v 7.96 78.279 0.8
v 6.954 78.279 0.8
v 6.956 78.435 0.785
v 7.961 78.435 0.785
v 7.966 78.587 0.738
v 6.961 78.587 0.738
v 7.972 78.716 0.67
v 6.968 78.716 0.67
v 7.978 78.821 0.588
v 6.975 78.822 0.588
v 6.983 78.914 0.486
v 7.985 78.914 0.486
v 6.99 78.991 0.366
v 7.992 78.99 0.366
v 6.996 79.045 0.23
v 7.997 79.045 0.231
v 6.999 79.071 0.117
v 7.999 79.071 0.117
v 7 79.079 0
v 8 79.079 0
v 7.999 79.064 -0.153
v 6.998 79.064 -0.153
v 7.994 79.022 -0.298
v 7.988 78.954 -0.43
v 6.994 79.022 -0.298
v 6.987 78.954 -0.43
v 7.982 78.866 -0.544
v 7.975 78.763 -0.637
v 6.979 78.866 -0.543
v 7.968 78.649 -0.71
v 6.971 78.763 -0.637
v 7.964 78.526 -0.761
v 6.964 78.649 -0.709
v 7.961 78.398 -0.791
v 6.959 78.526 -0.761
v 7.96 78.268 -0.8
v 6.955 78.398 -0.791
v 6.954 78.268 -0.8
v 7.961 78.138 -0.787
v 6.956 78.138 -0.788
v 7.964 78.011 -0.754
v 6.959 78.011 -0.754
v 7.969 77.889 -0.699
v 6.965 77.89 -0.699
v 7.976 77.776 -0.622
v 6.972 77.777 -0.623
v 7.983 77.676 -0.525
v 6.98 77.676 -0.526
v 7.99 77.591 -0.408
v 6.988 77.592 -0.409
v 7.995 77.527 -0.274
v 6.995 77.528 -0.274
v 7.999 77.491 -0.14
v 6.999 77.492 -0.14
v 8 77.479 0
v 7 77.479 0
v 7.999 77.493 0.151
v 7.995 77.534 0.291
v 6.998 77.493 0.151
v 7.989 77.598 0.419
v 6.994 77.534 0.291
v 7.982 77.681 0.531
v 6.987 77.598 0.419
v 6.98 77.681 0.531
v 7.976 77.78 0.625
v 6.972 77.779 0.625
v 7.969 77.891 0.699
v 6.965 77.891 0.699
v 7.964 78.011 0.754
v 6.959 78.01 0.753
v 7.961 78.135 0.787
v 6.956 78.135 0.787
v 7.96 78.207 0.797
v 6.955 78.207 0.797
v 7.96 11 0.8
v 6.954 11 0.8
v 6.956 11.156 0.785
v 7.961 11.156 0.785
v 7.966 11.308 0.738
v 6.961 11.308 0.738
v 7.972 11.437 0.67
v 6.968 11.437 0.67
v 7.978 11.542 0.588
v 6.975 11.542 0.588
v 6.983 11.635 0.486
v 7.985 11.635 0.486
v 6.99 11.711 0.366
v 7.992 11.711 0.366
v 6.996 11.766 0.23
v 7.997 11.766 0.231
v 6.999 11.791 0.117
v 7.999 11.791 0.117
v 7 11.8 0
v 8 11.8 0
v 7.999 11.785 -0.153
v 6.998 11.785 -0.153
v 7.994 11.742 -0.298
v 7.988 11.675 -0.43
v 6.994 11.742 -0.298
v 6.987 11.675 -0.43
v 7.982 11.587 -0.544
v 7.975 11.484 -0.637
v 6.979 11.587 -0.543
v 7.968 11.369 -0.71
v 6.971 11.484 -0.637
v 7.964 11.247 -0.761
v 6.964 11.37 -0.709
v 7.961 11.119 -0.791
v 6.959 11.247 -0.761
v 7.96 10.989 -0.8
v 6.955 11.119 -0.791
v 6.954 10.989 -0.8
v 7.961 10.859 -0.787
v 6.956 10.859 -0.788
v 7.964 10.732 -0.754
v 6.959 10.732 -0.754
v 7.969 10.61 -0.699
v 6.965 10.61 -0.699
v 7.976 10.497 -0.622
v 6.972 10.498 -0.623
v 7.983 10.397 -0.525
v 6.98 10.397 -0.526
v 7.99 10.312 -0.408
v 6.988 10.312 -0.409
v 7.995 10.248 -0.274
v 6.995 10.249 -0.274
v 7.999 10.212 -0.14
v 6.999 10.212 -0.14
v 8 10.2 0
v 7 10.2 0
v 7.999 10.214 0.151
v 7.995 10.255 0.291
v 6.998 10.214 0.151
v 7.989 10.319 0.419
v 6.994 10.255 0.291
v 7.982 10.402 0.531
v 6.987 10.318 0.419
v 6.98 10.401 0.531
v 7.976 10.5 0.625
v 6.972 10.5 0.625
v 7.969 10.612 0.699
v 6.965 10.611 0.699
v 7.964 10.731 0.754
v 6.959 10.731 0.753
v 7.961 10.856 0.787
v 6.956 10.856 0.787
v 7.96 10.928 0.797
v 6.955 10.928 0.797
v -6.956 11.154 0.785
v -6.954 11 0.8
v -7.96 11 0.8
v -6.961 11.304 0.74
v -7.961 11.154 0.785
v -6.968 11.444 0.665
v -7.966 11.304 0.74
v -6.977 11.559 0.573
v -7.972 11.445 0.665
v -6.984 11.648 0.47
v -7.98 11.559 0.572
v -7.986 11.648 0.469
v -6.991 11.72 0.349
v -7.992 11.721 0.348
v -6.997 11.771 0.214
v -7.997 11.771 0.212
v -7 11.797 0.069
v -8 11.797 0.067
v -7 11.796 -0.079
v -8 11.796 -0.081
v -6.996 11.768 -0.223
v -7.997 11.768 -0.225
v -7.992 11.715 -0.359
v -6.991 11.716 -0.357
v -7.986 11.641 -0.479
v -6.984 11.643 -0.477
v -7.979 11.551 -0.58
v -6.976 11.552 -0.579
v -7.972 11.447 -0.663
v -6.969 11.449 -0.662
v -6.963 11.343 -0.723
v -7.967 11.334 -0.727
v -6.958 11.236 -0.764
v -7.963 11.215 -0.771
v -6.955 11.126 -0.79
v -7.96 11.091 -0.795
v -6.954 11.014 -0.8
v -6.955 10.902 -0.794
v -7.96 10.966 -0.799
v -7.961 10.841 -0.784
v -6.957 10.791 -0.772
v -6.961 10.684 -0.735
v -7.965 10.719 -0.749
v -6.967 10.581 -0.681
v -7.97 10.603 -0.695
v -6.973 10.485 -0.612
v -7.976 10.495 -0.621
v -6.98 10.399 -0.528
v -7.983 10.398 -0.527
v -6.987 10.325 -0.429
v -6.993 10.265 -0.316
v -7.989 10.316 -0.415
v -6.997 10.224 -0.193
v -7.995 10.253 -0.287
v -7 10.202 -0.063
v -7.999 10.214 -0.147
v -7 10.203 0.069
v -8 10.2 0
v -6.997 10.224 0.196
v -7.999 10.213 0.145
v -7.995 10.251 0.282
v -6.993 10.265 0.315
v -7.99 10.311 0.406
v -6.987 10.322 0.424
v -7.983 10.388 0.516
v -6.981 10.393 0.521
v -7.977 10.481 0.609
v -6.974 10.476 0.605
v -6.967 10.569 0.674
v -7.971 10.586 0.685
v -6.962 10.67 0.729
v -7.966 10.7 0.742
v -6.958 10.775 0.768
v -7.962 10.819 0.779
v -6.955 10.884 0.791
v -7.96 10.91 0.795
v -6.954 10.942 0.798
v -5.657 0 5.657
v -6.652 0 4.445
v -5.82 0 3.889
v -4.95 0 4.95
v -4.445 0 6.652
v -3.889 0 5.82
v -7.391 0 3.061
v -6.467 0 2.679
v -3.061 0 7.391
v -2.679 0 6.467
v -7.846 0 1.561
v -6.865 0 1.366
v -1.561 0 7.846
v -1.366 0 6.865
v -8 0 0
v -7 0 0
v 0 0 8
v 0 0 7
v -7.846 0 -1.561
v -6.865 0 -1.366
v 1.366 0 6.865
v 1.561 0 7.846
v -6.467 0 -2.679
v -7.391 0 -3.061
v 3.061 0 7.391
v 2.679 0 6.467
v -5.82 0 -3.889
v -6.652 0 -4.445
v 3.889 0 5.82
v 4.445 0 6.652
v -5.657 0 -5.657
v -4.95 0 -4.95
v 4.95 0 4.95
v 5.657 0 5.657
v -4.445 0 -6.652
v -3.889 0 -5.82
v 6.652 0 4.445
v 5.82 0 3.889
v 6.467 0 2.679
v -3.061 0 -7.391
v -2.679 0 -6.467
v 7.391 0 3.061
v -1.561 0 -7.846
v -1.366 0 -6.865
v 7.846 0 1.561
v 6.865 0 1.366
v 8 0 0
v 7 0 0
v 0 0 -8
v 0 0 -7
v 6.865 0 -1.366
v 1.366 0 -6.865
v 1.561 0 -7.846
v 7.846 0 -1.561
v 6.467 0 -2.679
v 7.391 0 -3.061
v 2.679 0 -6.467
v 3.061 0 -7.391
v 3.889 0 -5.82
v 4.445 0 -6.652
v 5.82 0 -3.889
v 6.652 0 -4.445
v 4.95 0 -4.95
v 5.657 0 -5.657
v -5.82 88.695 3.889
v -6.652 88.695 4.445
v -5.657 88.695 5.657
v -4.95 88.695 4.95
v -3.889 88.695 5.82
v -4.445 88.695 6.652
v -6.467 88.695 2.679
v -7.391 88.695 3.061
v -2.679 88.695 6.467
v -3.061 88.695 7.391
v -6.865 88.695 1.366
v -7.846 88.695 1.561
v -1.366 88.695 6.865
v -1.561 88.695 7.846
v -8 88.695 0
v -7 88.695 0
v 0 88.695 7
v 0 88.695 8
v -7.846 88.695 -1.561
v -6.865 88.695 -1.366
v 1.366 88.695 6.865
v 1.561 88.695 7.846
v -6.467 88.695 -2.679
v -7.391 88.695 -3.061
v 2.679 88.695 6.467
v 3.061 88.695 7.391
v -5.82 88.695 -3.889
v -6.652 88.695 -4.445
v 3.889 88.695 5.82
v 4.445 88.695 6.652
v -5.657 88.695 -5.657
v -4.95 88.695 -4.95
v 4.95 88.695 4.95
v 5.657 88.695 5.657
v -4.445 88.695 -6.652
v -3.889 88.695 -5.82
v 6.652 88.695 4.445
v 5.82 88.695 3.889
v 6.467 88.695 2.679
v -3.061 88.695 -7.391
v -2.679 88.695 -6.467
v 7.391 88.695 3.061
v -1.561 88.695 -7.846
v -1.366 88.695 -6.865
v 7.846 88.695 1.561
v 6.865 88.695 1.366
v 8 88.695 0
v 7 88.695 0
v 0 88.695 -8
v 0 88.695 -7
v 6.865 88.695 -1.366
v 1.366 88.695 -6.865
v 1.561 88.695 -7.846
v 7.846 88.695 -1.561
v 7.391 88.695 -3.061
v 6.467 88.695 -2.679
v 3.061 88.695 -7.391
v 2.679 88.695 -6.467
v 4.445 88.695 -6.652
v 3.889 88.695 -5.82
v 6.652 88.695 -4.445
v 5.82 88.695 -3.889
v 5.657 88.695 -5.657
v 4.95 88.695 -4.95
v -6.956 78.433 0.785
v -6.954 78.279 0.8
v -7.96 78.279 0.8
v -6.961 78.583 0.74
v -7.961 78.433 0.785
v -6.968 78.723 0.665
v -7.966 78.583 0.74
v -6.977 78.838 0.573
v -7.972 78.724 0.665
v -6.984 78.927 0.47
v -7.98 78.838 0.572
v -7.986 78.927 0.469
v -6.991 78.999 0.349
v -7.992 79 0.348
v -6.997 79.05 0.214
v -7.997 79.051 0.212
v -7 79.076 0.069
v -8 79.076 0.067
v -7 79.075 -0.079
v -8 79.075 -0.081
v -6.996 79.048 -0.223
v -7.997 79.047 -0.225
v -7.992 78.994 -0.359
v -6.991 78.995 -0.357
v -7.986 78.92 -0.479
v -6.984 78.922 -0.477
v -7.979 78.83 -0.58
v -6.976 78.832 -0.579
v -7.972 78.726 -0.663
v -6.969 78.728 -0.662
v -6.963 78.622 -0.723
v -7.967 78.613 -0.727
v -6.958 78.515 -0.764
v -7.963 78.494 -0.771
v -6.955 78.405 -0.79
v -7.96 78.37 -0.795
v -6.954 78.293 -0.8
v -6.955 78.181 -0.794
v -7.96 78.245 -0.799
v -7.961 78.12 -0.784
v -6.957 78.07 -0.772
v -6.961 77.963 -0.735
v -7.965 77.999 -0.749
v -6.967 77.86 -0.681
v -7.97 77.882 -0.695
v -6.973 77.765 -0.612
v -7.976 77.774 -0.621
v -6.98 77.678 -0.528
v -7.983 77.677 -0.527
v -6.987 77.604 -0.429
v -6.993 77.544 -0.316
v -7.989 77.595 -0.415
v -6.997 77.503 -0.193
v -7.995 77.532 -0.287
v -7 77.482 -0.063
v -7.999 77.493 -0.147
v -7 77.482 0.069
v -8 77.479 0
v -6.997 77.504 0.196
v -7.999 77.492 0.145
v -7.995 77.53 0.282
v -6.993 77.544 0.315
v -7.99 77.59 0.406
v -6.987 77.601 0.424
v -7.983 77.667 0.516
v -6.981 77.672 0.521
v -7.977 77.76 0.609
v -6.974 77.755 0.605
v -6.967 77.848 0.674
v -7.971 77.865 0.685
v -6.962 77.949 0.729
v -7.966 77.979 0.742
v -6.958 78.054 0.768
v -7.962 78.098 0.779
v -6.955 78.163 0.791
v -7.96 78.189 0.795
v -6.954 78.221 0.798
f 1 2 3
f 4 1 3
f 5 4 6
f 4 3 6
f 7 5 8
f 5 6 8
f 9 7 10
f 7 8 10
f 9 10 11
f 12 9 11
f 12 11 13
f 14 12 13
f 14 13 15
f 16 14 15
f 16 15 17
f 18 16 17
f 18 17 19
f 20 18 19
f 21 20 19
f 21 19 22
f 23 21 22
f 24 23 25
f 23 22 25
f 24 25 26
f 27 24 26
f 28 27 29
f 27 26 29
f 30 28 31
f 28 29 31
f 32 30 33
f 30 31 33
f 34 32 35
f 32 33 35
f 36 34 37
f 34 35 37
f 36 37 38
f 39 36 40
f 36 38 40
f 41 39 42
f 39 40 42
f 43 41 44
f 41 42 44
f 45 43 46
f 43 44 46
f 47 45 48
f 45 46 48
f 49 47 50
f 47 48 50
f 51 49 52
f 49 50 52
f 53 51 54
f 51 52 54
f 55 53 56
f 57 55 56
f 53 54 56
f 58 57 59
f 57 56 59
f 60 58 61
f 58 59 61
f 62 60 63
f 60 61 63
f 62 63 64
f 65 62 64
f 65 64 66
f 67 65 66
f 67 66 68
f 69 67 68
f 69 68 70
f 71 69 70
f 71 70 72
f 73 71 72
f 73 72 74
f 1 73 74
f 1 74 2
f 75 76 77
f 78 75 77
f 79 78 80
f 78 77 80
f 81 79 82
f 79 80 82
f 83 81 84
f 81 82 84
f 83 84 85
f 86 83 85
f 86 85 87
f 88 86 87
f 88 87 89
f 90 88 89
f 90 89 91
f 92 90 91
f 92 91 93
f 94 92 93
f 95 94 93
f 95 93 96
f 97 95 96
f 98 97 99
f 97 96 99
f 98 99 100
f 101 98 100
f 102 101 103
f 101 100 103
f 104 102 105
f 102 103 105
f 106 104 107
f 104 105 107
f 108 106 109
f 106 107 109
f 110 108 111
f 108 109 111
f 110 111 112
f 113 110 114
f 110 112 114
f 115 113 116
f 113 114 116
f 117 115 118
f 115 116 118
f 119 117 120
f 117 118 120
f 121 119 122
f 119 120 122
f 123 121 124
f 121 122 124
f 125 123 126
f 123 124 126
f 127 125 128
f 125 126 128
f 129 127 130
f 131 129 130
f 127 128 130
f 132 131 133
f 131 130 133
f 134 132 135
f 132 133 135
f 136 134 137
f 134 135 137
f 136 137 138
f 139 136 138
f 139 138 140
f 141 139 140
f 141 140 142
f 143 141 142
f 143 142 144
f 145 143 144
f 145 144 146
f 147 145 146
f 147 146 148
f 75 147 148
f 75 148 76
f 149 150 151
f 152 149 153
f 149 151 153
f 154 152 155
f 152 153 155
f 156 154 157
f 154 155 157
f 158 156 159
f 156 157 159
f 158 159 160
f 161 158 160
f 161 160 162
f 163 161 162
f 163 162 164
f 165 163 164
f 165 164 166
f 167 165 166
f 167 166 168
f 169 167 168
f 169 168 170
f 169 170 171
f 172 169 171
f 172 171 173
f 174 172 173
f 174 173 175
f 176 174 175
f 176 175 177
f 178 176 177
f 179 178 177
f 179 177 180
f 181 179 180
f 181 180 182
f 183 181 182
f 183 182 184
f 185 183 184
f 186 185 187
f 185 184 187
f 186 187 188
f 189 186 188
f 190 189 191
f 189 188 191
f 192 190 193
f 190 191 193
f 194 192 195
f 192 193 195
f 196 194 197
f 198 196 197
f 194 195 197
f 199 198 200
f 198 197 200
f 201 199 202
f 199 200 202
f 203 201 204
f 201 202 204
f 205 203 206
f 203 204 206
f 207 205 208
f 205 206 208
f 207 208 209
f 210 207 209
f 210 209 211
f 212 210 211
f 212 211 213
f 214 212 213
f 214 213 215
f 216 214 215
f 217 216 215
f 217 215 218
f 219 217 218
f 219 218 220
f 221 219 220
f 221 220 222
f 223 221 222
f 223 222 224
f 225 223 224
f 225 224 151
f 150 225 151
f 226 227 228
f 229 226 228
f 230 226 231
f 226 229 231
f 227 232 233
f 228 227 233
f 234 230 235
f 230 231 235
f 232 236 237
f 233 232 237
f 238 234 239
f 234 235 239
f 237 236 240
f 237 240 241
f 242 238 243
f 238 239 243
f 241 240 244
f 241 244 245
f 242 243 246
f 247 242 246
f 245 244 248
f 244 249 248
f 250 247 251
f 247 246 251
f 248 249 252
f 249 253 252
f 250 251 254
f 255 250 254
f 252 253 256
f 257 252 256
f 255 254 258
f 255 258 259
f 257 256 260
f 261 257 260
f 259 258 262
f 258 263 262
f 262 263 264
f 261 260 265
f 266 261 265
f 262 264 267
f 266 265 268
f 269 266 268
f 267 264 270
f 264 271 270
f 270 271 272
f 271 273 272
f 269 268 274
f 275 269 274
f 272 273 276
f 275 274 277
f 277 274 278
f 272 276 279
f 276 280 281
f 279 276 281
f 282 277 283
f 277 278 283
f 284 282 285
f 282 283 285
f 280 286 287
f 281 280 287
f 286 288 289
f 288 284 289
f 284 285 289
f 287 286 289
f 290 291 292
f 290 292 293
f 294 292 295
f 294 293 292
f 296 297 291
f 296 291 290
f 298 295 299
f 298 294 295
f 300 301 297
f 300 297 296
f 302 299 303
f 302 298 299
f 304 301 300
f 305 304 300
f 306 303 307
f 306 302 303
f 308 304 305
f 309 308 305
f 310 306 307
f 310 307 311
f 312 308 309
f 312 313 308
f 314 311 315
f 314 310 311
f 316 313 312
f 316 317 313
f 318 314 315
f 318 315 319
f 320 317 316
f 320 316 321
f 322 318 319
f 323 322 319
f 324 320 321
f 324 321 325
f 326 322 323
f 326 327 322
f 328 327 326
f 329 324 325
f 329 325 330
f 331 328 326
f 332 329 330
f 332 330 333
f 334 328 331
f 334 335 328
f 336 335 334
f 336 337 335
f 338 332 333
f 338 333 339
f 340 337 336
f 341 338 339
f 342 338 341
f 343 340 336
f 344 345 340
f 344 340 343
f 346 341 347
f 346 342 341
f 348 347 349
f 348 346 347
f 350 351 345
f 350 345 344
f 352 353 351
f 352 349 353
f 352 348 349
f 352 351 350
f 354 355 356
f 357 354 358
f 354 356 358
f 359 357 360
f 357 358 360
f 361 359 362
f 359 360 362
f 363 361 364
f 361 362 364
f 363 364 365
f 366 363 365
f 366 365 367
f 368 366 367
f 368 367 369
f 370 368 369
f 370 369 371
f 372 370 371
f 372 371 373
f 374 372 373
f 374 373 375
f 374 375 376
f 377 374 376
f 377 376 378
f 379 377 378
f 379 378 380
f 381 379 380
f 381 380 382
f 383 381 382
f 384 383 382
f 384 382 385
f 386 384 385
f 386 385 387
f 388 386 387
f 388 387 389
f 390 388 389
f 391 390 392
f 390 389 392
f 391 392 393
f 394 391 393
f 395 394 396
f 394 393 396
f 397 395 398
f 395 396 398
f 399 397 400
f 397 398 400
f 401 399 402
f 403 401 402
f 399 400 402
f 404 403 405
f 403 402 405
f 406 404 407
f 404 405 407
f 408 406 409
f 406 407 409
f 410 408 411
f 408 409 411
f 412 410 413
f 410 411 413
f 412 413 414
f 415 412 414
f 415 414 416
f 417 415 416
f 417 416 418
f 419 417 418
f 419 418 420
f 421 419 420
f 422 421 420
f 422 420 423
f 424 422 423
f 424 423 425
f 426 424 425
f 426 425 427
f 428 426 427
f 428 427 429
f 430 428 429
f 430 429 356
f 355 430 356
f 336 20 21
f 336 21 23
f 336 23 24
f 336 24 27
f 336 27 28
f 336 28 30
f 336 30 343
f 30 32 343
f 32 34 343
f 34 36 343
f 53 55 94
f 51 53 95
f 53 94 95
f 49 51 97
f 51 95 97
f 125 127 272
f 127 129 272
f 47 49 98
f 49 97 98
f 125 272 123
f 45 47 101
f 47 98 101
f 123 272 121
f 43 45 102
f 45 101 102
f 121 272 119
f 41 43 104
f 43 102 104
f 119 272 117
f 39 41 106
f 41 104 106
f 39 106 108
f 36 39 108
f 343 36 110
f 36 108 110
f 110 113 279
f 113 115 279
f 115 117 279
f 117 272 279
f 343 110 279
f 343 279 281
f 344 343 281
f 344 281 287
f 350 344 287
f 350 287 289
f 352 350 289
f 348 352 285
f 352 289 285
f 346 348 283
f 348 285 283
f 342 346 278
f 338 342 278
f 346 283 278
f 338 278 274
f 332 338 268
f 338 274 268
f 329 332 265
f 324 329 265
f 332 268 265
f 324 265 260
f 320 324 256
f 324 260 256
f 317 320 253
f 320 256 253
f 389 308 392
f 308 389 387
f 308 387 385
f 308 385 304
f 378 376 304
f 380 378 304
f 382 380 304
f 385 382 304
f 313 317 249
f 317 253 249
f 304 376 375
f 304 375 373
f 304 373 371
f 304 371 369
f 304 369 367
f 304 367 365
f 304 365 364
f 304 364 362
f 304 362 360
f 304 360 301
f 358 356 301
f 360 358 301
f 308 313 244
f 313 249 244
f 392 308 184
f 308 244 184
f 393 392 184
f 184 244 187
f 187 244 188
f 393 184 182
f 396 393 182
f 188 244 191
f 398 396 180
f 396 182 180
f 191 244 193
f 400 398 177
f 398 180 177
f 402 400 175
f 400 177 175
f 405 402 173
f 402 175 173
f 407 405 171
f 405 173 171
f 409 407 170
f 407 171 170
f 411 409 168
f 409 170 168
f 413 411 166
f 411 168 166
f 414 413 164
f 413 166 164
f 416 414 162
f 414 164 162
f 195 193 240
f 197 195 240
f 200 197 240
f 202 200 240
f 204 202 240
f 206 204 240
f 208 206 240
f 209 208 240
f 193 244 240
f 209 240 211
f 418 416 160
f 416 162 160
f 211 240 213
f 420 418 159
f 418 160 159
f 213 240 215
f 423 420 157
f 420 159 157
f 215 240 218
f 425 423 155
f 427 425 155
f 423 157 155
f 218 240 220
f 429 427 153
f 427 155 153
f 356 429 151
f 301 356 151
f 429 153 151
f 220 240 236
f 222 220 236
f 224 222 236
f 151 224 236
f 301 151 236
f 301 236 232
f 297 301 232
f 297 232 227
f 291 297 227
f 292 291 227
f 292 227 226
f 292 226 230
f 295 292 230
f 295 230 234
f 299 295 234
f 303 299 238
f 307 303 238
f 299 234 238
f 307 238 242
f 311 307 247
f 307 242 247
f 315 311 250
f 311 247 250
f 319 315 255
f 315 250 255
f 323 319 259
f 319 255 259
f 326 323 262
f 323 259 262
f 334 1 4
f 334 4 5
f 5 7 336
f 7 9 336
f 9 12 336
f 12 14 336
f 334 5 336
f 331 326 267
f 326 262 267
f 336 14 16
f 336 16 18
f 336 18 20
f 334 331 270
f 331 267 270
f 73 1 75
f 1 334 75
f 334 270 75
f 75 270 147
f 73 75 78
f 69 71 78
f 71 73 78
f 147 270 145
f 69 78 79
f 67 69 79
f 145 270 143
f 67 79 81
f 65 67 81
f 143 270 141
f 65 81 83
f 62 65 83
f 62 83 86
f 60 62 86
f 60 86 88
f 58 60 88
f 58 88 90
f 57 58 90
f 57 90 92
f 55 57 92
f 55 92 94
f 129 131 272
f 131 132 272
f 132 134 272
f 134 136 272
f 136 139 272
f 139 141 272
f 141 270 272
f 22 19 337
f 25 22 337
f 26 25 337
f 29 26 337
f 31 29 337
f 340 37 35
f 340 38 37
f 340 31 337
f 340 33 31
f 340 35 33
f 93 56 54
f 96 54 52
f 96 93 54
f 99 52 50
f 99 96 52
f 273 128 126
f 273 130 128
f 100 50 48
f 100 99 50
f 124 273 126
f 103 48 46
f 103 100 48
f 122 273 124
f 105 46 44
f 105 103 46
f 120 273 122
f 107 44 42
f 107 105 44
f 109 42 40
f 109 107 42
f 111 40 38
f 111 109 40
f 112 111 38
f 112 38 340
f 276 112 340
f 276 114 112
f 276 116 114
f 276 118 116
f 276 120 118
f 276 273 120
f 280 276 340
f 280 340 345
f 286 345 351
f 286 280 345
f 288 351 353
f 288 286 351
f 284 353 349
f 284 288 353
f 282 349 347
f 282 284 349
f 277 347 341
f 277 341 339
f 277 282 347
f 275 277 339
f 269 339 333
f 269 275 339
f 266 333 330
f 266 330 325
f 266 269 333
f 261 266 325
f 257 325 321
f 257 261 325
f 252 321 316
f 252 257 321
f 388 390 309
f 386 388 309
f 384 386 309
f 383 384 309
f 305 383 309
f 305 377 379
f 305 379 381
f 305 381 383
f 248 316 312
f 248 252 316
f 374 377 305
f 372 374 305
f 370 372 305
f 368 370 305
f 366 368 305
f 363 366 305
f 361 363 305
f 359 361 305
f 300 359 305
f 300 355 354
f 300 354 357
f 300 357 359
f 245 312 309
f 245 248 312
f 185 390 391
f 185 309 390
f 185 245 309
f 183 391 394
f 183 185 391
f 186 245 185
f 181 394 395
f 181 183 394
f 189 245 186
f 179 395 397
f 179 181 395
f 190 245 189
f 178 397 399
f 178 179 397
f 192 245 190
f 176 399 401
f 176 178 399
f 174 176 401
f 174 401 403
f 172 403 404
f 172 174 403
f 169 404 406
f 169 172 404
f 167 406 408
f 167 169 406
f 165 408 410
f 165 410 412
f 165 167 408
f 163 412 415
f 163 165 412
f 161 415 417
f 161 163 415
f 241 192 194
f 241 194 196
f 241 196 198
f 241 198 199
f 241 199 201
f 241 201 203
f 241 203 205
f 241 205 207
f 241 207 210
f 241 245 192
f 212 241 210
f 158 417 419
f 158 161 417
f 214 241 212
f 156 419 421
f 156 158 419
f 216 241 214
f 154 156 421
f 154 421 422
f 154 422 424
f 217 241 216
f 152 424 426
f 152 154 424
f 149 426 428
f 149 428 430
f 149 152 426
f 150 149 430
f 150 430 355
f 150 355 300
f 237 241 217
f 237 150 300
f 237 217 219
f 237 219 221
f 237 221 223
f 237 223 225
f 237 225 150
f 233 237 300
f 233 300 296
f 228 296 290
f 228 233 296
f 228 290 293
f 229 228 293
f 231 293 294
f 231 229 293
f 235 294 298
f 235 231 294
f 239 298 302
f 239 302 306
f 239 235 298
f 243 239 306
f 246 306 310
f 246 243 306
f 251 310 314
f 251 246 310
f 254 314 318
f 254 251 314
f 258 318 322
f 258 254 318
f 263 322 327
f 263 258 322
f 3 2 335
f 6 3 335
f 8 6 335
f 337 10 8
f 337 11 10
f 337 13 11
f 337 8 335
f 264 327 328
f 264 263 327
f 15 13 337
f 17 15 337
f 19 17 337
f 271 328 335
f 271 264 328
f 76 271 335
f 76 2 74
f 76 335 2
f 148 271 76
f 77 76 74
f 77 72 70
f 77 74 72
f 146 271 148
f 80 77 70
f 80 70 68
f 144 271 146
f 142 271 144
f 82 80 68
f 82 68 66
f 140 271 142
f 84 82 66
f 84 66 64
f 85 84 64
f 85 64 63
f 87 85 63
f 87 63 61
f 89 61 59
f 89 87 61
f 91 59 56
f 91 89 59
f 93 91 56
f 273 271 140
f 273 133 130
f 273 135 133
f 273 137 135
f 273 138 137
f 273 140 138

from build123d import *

# Parameters (mm, degrees)
SKETCH2_R           = 8
SKETCH2_R_2         = 7
BOSS_EXTRUDE2_DEPTH = 88.69527324
M2_TAPPED_HOLE1_D   = 1.6
M2_TAPPED_HOLE2_D   = 1.6


with BuildPart() as part:
    # Sketch2 → Boss-Extrude2 (new body)
    with BuildSketch(Plane(origin=(0, 0, 0), x_dir=(1, 0, 0), z_dir=(0, 1, 0))):
        Circle(SKETCH2_R)
        Circle(SKETCH2_R_2, mode=Mode.SUBTRACT)
    extrude(amount=BOSS_EXTRUDE2_DEPTH)

    # M2 Tapped Hole1 (through all)
    with Locations(Plane(origin=(8, 0, 0), x_dir=(0, 0, -1), z_dir=(1, 0, 0))):
        with Locations((0, 78.27915224)):
            Hole(M2_TAPPED_HOLE1_D / 2)

    # M2 Tapped Hole2 (through all)
    with Locations(Plane(origin=(8, 0, 0), x_dir=(0, 0, -1), z_dir=(1, 0, 0))):
        with Locations((0, 11)):
            Hole(M2_TAPPED_HOLE2_D / 2)


solid = part.part
